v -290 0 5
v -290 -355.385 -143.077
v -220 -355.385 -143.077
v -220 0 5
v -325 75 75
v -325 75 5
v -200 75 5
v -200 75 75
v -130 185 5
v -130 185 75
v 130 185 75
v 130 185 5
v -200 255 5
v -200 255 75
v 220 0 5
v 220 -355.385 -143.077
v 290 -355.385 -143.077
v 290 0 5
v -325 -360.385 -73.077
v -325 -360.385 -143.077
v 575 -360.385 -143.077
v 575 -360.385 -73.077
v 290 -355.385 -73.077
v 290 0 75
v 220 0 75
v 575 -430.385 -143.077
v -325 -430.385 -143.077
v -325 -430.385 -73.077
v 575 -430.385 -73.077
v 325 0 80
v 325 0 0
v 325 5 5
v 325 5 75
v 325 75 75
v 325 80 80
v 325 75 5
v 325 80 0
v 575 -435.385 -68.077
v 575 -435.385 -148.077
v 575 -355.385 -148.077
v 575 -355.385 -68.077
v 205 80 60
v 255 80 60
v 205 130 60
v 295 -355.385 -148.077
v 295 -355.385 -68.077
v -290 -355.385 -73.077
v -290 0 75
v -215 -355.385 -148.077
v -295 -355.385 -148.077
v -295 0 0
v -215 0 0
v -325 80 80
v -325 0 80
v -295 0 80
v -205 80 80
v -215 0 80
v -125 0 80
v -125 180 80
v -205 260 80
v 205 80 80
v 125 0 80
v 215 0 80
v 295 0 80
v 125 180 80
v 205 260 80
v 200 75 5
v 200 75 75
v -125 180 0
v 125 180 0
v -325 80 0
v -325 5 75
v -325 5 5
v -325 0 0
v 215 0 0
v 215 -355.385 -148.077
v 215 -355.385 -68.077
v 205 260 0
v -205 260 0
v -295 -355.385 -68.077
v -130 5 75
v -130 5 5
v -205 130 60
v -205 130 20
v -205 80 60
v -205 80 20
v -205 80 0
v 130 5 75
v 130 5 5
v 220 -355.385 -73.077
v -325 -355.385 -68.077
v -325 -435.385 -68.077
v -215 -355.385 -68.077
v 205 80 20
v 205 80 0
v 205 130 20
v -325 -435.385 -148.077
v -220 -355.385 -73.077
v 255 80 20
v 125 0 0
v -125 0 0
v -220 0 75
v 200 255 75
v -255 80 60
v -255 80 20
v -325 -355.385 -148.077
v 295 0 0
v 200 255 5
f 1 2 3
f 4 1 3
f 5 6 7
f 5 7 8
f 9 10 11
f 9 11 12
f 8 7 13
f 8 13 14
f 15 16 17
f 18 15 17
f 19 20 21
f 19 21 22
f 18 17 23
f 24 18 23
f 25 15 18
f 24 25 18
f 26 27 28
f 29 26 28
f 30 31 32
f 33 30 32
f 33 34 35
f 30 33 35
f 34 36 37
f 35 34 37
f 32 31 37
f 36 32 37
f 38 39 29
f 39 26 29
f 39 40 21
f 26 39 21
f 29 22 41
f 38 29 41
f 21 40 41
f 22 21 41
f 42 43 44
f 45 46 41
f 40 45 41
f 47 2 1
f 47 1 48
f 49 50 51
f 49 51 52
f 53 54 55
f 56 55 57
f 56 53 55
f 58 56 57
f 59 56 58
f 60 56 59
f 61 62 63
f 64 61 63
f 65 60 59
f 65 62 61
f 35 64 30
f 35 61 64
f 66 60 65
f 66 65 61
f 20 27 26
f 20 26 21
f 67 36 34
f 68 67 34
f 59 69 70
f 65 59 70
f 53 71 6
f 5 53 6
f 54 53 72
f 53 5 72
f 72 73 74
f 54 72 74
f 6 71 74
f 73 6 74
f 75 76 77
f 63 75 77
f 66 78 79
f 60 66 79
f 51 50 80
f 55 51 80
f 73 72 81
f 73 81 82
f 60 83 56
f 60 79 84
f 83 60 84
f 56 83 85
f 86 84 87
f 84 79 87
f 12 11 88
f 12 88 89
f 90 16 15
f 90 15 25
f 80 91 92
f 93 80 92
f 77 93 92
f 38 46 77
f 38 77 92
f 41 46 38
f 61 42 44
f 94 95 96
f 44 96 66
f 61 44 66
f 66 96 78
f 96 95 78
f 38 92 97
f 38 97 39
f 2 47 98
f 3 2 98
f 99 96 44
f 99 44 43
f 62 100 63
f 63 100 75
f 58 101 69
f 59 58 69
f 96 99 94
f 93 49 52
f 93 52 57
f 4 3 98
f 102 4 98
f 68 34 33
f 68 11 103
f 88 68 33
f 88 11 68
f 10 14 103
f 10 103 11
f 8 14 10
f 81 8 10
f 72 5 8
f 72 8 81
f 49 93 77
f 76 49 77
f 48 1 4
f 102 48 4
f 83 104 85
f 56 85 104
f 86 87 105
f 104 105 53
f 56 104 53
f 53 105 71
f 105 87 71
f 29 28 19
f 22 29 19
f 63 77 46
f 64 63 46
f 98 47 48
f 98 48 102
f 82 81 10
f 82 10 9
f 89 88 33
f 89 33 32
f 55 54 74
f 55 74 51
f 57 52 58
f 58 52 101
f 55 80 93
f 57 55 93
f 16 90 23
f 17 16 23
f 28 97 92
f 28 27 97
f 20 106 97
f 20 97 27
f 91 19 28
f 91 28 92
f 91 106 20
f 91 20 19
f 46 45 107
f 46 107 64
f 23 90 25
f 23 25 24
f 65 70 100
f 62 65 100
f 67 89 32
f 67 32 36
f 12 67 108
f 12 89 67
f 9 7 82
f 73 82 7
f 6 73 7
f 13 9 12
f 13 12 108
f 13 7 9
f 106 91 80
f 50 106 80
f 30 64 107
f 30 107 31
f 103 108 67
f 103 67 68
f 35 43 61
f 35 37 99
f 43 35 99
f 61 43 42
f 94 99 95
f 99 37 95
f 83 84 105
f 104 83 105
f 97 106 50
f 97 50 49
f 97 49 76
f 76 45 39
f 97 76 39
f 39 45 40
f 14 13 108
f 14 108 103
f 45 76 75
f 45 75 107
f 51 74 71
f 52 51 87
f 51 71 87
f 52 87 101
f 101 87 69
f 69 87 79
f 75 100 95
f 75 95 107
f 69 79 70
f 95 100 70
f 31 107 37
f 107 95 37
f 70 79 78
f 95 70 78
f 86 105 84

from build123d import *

# Parameters (mm, degrees)
EXTRUDE_1_DEPTH     = 80
SKETCH_2_W          = 80
SKETCH_2_H          = 80
SKETCH_2_W_2        = 70
SKETCH_2_H_2        = 70
EXTRUDE_2_DEPTH     = 385
SKETCH_4_W          = 900
SKETCH_4_H          = 80
EXTRUDE_3_DEPTH     = 80
EXTRUDE_5_DEPTH     = 40
SKETCH_8_W          = 70
SKETCH_8_H          = 70
CUT_EXTRUDE_1_DEPTH = 1011.686172094


with BuildPart() as part:
    # 草图1 → 凸台-拉伸1 (new body)
    with BuildSketch(Plane.XY):
        Polygon((-125, 180), (125, 180), (125, 0), (325, 0), (325, 80), (205, 80), (205, 260), (-205, 260), (-205, 80), (-325, 80), (-325, 0), (-125, 0), align=None)
    extrude(amount=EXTRUDE_1_DEPTH)

    # 草图2 → 凸台-拉伸2 (add, along a direction that is not the sketch's normal)
    # profile 1 of 2: a face of its own
    with BuildSketch(Plane.XZ):
        with Locations((-255, 40)):
            Rectangle(SKETCH_2_W, SKETCH_2_H)
        with Locations((-255, 40)):
            Rectangle(SKETCH_2_W_2, SKETCH_2_H_2, mode=Mode.SUBTRACT)
    # profile 2 of 2: a face of its own
    with BuildSketch(Plane.XZ):
        with Locations((255, 40)):
            Rectangle(SKETCH_2_W, SKETCH_2_H)
        with Locations((255, 40)):
            Rectangle(SKETCH_2_W_2, SKETCH_2_H_2, mode=Mode.SUBTRACT)
    extrude(amount=EXTRUDE_2_DEPTH, dir=(0, -0.923076923076923, -0.3846153846153847))

    # 草图4 → 凸台-拉伸3 (add)
    with BuildSketch(Plane.XZ.offset(355.384615385)):
        with Locations((125, -108.076923077)):
            Rectangle(SKETCH_4_W, SKETCH_4_H)
    extrude(amount=EXTRUDE_3_DEPTH)

    # 草图6 → 凸台-拉伸5 (add)
    with BuildSketch(Plane.XY.offset(20)):
        Polygon((-205, 130), (-255, 80), (-205, 80), align=None)
        Polygon((205, 130), (255, 80), (205, 80), align=None)
    extrude(amount=EXTRUDE_5_DEPTH)

    # 草图8 → 切除-拉伸1 (cut, through all)
    with BuildSketch(Plane.ZY.offset(325)):
        with Locations((-108.076923077, -395.384615385)):
            Rectangle(SKETCH_8_W, SKETCH_8_H)
    extrude(amount=-CUT_EXTRUDE_1_DEPTH, mode=Mode.SUBTRACT)

    # 切除-扫描1: sweep along a path in 草图10
    with BuildLine(Plane(origin=(0, 0, 40), x_dir=(-1, 0, 0), z_dir=(0, 0, -1))) as sweep_1_path:
        Line((-325, 40), (-165, 40))
        Line((-165, 40), (-165, 220))
        Line((-165, 220), (165, 220))
        Line((165, 220), (165, 40))
        Line((165, 40), (325, 40))
    # 草图9 → 切除-扫描1 (sweep, cut)
    with BuildSketch(Plane(origin=(325, 0, 0), x_dir=(0, 0, -1), z_dir=(1, 0, 0))):
        Polygon((-5, 5), (-5, 75), (-20, 75), (-60, 75), (-75, 75), (-75, 5), align=None)
    sweep(path=sweep_1_path.line, transition=Transition.RIGHT, mode=Mode.SUBTRACT)


solid = part.part
